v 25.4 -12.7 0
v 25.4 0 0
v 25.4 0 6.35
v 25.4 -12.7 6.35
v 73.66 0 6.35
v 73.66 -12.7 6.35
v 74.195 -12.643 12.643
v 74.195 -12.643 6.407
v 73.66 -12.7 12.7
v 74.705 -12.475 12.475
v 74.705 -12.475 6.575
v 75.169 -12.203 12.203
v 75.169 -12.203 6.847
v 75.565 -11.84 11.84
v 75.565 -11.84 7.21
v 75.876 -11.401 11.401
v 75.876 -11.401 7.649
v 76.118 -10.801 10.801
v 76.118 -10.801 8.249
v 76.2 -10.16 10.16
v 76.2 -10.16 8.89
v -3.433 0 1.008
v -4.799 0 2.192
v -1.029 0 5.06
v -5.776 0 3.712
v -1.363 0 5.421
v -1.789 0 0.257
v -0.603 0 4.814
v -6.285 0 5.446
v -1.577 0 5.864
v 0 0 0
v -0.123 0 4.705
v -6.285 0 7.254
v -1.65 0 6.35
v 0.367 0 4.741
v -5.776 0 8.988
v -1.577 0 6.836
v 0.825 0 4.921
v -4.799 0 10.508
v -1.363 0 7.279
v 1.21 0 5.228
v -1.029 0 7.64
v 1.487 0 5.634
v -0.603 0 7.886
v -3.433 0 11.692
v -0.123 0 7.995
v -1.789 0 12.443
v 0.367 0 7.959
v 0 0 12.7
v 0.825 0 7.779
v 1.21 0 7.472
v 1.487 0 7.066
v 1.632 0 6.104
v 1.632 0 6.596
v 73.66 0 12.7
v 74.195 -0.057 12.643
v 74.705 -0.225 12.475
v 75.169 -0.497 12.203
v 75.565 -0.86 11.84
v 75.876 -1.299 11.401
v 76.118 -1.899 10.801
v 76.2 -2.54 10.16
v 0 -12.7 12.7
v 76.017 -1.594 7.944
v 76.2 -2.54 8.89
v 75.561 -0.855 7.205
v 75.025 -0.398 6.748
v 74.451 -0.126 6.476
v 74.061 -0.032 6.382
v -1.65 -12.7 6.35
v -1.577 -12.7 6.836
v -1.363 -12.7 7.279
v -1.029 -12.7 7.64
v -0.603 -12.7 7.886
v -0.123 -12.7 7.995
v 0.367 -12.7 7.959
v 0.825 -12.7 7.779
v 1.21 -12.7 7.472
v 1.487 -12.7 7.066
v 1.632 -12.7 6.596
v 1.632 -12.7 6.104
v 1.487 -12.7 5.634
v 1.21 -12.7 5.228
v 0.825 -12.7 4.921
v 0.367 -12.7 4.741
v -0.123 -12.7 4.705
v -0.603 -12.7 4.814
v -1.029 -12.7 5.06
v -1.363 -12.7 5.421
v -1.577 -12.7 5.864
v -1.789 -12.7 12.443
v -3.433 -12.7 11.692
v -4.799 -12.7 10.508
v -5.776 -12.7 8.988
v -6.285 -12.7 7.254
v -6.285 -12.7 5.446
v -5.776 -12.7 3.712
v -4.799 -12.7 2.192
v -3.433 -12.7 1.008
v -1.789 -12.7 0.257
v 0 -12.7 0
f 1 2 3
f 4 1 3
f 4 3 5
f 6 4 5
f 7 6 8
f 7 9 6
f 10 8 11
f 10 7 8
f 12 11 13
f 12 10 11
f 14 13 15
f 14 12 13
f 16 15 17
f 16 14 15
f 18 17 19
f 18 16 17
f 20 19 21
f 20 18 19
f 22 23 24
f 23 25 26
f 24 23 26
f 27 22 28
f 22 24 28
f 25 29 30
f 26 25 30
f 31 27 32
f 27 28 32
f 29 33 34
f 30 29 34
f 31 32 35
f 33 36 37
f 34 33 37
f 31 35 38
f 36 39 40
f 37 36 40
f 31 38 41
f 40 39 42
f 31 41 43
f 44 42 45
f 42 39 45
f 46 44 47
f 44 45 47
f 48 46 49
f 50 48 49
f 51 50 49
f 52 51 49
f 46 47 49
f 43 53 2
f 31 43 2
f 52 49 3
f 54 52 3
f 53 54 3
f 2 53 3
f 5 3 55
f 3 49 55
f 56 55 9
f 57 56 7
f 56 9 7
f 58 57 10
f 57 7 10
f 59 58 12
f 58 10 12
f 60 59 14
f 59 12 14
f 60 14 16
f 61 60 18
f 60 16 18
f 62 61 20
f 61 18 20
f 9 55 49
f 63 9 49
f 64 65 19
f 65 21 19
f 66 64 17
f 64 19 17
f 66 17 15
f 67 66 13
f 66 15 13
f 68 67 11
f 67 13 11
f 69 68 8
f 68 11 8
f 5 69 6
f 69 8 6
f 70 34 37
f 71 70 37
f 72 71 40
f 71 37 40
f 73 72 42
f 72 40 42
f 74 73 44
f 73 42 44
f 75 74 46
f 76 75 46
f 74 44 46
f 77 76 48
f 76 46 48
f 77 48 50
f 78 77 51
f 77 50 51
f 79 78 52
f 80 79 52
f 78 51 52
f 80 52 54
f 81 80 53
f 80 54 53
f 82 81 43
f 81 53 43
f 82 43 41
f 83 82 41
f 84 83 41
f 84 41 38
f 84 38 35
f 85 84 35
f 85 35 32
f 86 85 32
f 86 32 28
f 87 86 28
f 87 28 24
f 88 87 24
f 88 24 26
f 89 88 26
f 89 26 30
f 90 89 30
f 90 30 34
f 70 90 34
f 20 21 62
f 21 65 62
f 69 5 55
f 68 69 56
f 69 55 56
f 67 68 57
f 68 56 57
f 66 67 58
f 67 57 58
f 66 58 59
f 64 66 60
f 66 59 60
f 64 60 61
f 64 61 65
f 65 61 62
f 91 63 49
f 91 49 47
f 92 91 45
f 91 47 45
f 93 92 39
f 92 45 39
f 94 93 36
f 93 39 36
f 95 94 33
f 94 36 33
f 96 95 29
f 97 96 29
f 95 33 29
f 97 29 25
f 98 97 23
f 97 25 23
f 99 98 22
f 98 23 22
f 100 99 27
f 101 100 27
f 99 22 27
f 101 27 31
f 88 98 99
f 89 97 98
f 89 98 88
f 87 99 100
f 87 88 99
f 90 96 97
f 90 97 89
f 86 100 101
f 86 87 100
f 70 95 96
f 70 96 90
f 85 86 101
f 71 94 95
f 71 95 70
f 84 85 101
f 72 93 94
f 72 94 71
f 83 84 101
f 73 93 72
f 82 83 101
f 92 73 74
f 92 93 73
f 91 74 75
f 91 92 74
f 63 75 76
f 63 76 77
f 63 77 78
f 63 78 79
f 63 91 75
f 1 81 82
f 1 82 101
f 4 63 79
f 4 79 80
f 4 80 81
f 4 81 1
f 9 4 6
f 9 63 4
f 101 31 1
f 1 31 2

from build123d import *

# Parameters (mm, degrees)
F1_DEPTH       = 12.7
F3_D           = 3.3
F3_CBORE_D     = 6.5
F3_CBORE_DEPTH = 0
F4_R           = 2.54


with BuildPart() as f1:
    # F0 (on Front) → F1 (new body)
    with BuildSketch(Plane.XZ):
        with BuildLine():
            ThreePointArc((0, 12.7), (-6.35, 6.35), (0, 0))
            Line((0, 0), (25.4, 0))
            Line((25.4, 0), (25.4, 6.35))
            Line((25.4, 6.35), (76.2, 6.35))
            Line((76.2, 6.35), (76.2, 12.7))
            Line((76.2, 12.7), (19.05, 12.7))
            Line((19.05, 12.7), (0, 12.7))
        make_face()
    extrude(amount=F1_DEPTH)

    # F3 (through all)
    with Locations(Plane.XZ.offset(12.7)):
        with Locations((0, 6.35)):
            CounterBoreHole(F3_D / 2, F3_CBORE_D / 2, F3_CBORE_DEPTH)

    # F4
    f4_edges = [f1.edges().sort_by_distance(p)[0] for p in [
        (76.2, -12.7, 9.525),
        (76.2, -6.35, 6.35),
        (76.2, -6.35, 12.7),
        (76.2, 0, 9.525),
    ]]
    fillet(f4_edges, radius=F4_R)


solid = f1.part
